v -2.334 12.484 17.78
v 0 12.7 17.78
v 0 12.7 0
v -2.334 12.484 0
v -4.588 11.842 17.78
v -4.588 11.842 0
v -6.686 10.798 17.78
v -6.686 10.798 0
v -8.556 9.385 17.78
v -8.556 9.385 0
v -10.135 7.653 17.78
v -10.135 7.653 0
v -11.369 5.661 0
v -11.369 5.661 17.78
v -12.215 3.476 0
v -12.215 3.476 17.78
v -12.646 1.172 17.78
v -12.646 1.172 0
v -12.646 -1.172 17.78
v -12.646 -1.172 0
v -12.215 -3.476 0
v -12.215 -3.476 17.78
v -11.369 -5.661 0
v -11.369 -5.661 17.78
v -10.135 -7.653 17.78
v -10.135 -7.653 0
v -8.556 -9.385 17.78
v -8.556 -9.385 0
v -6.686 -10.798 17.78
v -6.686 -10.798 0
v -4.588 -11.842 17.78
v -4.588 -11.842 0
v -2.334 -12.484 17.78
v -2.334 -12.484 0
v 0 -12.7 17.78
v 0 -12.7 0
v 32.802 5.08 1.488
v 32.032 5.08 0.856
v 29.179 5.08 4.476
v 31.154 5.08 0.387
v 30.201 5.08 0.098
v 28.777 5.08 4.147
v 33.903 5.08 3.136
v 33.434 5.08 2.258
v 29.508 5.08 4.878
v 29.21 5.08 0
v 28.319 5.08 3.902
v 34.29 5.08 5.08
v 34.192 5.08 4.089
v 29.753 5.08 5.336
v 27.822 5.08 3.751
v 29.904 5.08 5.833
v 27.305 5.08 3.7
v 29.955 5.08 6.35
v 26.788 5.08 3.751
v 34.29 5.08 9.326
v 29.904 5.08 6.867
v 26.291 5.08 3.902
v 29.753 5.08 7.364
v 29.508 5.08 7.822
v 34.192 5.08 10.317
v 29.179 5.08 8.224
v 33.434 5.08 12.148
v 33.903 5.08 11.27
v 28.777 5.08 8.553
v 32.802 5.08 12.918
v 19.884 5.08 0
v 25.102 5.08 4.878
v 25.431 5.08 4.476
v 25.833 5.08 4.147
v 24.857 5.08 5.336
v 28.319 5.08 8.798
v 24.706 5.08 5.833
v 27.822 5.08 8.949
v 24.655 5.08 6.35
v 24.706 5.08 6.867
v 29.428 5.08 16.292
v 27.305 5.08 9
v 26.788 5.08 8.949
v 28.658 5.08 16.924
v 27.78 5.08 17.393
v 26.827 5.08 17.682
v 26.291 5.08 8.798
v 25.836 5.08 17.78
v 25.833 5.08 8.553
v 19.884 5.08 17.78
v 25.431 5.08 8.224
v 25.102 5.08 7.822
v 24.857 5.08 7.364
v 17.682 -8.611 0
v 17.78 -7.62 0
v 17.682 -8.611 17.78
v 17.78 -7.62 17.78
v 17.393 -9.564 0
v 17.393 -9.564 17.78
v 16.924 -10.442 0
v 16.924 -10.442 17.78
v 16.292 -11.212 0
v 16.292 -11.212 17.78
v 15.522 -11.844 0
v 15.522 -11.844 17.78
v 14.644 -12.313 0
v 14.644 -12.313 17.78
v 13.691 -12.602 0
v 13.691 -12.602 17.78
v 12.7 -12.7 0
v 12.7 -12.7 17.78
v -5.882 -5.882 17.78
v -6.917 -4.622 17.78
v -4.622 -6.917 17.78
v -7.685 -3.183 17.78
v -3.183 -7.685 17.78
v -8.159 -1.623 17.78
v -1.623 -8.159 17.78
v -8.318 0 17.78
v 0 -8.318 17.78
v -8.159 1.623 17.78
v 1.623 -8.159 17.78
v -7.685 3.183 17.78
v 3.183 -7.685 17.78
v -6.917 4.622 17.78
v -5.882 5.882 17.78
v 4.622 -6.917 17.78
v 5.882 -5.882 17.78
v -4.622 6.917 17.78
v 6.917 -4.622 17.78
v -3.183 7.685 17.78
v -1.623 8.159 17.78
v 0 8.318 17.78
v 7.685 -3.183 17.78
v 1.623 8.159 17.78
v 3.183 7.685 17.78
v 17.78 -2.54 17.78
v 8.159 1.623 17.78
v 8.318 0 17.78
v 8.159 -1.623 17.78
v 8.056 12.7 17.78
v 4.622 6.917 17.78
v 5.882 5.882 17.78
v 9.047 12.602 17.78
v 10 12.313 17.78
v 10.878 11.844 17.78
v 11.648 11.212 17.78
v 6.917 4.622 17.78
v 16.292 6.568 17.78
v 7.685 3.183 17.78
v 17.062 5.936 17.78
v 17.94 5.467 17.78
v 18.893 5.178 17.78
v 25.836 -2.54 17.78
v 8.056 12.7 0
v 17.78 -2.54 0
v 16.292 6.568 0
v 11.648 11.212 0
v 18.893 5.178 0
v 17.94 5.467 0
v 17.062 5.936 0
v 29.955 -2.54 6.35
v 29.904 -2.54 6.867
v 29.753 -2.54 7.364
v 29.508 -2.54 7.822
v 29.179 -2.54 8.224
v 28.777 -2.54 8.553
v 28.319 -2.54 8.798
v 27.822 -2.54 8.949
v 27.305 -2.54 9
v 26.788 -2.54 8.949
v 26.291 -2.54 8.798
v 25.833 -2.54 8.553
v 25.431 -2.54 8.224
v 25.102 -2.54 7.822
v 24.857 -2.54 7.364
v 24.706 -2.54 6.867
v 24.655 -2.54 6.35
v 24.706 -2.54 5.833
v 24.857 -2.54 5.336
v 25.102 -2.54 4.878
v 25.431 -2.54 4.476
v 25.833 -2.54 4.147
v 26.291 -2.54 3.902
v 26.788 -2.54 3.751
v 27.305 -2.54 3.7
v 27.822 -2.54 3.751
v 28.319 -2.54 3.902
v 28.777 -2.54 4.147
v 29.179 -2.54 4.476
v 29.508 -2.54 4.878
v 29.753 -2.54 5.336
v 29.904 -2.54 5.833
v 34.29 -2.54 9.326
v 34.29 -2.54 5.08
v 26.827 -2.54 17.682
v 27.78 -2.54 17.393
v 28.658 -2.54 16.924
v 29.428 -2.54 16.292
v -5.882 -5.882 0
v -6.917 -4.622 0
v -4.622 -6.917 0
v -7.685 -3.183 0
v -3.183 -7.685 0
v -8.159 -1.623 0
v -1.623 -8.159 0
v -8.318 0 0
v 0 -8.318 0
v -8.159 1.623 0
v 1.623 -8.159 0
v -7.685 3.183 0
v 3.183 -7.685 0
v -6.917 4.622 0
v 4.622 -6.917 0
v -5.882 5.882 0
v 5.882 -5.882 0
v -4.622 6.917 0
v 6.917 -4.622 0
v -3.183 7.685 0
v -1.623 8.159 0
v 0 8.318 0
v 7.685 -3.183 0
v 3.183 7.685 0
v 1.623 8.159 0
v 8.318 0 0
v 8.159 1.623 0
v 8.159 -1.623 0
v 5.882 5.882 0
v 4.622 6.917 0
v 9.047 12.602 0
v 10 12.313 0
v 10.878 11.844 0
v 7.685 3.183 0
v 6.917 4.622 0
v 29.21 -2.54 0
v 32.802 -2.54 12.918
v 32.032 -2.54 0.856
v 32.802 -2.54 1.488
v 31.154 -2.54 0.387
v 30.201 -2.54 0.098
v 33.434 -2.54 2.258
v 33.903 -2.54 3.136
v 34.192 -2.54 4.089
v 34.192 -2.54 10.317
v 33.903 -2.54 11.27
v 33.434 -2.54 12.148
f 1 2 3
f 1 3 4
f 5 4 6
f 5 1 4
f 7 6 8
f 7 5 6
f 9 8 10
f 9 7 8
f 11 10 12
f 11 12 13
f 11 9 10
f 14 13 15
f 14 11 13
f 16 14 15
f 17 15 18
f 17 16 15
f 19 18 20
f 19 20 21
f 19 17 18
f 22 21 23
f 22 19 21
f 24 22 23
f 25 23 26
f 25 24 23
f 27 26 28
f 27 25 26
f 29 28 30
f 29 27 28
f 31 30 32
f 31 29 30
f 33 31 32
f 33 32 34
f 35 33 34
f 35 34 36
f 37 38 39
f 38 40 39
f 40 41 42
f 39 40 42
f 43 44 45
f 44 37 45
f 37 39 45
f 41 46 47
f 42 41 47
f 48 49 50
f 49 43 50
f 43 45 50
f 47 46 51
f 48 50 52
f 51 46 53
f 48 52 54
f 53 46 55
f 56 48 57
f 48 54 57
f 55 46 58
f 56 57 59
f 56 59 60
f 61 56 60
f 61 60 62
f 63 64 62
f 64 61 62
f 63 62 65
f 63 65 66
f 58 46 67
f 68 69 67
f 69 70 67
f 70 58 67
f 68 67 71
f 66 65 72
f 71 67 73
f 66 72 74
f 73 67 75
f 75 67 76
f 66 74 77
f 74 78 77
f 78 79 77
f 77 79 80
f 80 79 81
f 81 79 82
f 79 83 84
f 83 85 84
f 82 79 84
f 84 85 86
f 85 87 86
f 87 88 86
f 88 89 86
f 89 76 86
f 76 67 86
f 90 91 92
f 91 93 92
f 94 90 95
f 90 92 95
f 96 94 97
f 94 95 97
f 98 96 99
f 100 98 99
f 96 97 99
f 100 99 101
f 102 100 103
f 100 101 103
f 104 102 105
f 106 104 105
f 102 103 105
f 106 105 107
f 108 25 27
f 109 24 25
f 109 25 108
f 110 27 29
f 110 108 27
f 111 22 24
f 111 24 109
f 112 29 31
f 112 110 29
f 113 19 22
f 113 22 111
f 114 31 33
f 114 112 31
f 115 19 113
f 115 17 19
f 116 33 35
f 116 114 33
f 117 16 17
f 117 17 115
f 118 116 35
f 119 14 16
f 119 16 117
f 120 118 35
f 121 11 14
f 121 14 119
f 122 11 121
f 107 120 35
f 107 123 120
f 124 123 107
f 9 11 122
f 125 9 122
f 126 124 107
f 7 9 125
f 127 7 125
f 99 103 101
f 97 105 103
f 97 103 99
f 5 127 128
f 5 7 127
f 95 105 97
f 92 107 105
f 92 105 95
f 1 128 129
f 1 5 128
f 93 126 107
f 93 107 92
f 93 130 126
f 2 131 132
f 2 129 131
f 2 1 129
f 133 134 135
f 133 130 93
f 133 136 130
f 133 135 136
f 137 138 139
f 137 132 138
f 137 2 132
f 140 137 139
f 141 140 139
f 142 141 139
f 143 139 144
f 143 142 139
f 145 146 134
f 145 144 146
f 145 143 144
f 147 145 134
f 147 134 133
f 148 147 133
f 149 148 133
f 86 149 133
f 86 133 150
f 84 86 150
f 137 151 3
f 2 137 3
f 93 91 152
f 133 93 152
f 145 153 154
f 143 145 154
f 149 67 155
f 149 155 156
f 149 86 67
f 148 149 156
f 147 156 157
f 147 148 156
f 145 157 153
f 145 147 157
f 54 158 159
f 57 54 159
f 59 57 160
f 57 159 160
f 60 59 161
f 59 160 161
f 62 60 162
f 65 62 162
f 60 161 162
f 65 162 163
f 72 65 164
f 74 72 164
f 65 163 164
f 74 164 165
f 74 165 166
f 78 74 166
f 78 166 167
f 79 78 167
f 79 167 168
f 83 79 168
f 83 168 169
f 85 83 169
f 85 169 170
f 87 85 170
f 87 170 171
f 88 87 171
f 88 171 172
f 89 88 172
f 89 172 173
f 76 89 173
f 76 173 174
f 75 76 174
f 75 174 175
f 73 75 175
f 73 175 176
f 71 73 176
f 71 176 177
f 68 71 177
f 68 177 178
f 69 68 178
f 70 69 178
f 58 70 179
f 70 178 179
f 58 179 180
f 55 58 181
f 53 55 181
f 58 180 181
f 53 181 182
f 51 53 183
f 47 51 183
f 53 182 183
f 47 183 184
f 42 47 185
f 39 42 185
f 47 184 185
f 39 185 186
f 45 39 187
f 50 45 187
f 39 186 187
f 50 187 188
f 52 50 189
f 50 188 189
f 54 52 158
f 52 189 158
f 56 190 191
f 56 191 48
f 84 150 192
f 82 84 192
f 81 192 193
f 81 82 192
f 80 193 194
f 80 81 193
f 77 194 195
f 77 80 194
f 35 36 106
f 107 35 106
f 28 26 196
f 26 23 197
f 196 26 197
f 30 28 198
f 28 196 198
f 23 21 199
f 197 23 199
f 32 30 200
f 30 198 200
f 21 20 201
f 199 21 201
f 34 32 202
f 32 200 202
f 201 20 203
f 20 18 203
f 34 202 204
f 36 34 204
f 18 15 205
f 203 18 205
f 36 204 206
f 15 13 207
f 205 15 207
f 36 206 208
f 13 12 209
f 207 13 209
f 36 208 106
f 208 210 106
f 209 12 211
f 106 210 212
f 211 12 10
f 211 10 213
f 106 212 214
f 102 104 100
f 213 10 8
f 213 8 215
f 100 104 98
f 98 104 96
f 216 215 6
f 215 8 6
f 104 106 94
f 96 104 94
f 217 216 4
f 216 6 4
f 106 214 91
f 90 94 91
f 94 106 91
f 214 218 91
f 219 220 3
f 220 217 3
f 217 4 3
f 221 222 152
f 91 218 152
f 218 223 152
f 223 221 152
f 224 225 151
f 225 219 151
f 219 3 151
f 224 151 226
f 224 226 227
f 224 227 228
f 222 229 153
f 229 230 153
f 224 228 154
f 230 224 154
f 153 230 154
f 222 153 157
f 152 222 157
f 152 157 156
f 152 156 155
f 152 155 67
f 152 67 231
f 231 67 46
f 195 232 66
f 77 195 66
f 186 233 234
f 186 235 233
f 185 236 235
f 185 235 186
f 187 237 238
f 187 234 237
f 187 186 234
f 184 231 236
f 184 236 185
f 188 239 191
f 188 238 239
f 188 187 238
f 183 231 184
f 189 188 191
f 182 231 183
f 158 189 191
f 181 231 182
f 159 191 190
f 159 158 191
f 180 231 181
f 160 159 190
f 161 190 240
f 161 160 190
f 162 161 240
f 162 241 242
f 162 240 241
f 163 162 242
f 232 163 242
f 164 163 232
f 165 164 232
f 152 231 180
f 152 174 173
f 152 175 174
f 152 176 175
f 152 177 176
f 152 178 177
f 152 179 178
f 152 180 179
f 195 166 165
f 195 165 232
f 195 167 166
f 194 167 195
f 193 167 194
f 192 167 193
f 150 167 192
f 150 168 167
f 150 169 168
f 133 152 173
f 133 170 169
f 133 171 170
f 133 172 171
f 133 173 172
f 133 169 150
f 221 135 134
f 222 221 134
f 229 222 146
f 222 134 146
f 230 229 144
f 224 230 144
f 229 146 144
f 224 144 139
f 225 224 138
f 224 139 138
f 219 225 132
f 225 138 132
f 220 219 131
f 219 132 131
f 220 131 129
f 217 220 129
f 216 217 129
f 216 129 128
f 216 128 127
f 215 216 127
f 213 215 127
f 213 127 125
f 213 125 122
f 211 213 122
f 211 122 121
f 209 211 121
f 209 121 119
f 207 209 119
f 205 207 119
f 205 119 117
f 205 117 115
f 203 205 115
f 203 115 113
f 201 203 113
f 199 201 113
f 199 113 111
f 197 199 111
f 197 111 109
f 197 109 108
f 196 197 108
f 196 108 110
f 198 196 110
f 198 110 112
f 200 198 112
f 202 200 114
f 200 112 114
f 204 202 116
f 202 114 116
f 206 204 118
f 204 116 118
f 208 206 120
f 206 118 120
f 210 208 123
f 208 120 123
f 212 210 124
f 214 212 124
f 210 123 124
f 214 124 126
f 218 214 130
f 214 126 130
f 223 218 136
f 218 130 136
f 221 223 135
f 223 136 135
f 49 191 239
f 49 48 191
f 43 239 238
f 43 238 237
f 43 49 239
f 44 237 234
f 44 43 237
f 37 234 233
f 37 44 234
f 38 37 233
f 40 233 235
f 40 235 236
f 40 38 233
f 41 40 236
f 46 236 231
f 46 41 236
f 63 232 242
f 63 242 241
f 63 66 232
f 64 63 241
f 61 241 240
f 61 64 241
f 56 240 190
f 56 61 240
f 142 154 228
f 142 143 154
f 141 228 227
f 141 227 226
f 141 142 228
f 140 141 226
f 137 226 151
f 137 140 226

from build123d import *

# Parameters (mm, degrees)
F1_DEPTH  = 17.78
F2_W      = 7.62
F2_H      = 17.78
F3_DEPTH  = 16.51
F4_SIZE   = 6.35
F5_R      = 2.65
F6_DEPTH  = 25.4
F7_R      = 5.08
F12_DEPTH = 17.78
F13_R     = 8.3185
F14_DEPTH = 17.781


# Not quite as in the source:
# - two fillets or chamfers of one size are made in one step
# - a feature names something its author has since deleted; it is built from what else it names


with BuildPart() as f1:
    # F0 (on Top) → F1 (new body)
    with BuildSketch(Plane.XY):
        Polygon((0, 12.7), (0, -12.7), (17.78, -12.7), (17.78, 5.08), (10.16, 12.7), align=None)
    extrude(amount=F1_DEPTH)

    # F2 (on face) → F3 (join)
    with BuildSketch(Plane.YZ.offset(17.78)):
        with Locations((1.27, 8.89)):
            Rectangle(F2_W, F2_H)
    extrude(amount=F3_DEPTH)

    # F4
    f4_edges = [f1.edges().sort_by_distance(p)[0] for p in [
        (34.29, 1.27, 17.78),
    ]]
    chamfer(f4_edges, length=F4_SIZE)

    # F5 (on face) → F6 (cut)
    with BuildSketch(Plane.XZ.offset(2.54)):
        with Locations((27.305, 6.35)):
            Circle(F5_R)
    extrude(amount=-F6_DEPTH, mode=Mode.SUBTRACT)

    # F7
    f7_edges = [f1.edges().sort_by_distance(p)[0] for p in [
        (27.94, 1.27, 17.78),
        (34.29, 1.27, 11.43),
        (17.78, -12.7, 8.89),
        (17.78, 5.08, 8.89),
        (10.16, 12.7, 8.89),
        (34.29, 1.27, 0),
    ]]
    fillet(f7_edges, radius=F7_R)

    # F11 (on face) → F12 (join, through all)
    with BuildSketch(Plane.XY.offset(17.78)):
        with BuildLine():
            Line((0, -12.7), (0, 12.7))
            ThreePointArc((0, 12.7), (-12.7, 0), (0, -12.7))
        make_face()
    extrude(amount=-F12_DEPTH)

    # F13 (on face) → F14 (cut, through all)
    with BuildSketch(Plane.XY.offset(17.78)):
        Circle(F13_R)
    extrude(amount=-F14_DEPTH, mode=Mode.SUBTRACT)


solid = f1.part
